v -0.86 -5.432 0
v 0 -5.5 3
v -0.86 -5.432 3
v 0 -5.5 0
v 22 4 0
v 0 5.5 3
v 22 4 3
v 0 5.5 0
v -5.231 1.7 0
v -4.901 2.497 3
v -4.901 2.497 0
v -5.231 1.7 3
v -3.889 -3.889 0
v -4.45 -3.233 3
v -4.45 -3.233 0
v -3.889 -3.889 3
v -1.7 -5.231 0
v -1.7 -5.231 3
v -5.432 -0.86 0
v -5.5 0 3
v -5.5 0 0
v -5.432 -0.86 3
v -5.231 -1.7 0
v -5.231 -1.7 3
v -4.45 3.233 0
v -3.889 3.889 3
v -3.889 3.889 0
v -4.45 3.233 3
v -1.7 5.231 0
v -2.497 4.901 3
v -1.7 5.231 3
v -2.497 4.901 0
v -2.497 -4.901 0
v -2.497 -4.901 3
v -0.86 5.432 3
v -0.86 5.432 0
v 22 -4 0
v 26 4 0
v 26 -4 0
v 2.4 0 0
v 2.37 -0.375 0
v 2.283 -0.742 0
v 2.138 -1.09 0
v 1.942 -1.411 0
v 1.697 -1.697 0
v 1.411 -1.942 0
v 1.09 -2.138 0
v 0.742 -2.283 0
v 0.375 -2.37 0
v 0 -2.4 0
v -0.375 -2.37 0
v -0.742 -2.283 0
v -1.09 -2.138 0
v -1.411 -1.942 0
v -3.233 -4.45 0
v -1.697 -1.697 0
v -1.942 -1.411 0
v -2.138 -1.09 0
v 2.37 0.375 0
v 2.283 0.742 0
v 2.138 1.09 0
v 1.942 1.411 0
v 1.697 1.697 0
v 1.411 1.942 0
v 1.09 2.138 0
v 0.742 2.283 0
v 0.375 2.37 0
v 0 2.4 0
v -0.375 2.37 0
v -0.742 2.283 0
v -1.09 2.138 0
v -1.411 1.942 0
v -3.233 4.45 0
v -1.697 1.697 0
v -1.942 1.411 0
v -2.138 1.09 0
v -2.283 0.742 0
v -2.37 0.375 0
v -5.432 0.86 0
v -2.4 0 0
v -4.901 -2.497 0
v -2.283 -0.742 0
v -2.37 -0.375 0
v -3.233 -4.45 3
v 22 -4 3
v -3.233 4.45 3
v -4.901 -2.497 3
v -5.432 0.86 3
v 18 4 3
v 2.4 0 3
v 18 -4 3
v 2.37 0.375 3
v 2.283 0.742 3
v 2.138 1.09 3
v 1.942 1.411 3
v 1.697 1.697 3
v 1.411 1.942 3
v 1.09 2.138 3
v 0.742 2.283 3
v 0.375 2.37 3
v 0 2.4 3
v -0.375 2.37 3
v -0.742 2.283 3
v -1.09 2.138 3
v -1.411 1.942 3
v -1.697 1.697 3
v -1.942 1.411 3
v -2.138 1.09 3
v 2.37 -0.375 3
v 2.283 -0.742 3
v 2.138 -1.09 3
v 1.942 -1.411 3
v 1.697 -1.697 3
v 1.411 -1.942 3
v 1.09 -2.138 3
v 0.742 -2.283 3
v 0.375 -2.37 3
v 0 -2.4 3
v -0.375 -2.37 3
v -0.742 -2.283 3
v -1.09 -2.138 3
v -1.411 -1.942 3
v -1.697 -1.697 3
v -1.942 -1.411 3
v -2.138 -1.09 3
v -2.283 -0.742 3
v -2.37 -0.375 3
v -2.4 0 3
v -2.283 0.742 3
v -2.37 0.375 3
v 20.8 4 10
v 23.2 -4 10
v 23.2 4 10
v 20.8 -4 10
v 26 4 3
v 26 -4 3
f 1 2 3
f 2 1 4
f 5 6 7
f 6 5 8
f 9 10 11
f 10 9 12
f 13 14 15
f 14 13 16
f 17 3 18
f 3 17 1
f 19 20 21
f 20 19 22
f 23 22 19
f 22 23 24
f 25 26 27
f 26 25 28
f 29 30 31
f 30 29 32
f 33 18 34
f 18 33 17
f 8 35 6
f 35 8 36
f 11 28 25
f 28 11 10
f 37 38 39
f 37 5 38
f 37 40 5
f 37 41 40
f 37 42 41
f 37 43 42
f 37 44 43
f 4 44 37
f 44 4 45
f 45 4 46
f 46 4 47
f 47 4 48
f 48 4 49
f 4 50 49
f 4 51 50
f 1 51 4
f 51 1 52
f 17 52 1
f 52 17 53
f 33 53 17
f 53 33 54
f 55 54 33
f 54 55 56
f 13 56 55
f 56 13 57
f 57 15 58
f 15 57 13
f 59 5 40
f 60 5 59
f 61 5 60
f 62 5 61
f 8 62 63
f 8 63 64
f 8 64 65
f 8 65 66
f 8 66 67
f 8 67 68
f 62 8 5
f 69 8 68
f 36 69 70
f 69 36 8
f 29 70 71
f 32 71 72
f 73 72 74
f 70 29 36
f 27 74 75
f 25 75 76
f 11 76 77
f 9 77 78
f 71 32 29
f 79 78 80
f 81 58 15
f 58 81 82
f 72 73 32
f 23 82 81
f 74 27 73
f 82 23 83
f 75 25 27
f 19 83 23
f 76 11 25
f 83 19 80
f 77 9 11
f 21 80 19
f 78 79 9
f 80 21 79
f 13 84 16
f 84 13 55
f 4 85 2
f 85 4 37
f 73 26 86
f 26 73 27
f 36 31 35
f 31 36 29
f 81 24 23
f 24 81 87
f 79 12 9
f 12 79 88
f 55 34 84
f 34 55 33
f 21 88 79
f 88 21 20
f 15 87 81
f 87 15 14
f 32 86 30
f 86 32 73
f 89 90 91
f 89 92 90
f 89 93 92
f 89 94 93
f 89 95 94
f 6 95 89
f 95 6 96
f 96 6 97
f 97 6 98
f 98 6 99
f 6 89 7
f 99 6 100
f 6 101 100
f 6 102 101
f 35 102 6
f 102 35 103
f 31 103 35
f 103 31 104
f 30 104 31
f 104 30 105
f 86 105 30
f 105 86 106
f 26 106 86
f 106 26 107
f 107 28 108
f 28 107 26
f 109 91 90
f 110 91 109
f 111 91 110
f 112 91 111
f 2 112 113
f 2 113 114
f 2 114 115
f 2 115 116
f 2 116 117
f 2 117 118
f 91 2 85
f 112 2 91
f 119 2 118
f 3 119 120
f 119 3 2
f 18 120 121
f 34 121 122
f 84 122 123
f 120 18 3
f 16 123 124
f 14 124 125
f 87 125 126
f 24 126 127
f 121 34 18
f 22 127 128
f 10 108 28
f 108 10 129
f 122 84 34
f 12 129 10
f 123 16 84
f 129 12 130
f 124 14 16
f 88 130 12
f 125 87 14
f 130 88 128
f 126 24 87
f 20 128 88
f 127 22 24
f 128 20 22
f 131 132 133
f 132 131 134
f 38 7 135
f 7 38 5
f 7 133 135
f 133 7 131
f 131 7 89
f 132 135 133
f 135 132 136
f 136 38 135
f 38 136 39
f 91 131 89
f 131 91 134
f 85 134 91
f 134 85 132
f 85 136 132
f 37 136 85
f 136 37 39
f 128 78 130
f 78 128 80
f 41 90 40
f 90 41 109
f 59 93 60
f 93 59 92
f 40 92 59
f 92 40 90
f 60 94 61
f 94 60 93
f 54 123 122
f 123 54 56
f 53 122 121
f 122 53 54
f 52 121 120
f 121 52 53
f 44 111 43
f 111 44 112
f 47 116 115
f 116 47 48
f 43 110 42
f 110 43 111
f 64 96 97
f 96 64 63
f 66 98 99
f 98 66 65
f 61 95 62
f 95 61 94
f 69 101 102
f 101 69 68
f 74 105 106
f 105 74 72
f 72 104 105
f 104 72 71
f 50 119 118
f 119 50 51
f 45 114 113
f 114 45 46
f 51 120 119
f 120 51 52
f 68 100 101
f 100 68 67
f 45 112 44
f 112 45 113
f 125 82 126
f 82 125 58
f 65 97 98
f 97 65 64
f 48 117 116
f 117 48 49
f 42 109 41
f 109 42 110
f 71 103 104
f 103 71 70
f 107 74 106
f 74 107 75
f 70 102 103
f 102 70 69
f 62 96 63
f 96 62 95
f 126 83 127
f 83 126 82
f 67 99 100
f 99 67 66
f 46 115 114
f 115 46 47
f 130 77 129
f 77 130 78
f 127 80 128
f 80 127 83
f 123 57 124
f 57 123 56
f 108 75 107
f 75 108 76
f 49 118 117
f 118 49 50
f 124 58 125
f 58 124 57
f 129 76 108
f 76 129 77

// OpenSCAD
// STARYS — крюк защёлки, прототип v0.1.
//
// Надевается на крестовую качалку сервопривода SG90 внутри модуля.
// 0°  — крюк спрятан за гранью (защёлка открыта);
// 90° — крюк выходит через окно и цепляет штифт в окне соседа.
// Защёлки симметричны: у каждого модуля свой крюк и свой штифт,
// поэтому любые две грани стыкуются без «папы» и «мамы».

arm_len = 22;     // от оси сервопривода до зуба
arm_w = 8;
arm_t = 3;
hook_h = 7;       // высота зуба
hole_d = 4.8;     // посадка на вал SG90 (шлиц ~4.7 мм)
screw_d = 2.2;    // винт качалки
$fn = 40;

difference() {
  union() {
    hull() {
      cylinder(d = arm_w + 3, h = arm_t);
      translate([arm_len, 0, 0]) cylinder(d = arm_w, h = arm_t);
    }
    // зуб с фаской: при закрытии он скользит по штифту и заходит за него
    translate([arm_len - arm_w / 2, -arm_w / 2, 0])
      hull() {
        cube([arm_w, arm_w, arm_t]);
        translate([arm_w * 0.35, 0, 0]) cube([arm_w * 0.3, arm_w, hook_h + arm_t]);
      }
  }
  translate([0, 0, -1]) cylinder(d = hole_d, h = arm_t + 2);
  translate([0, 0, -1]) cylinder(d = screw_d, h = 20);
}
